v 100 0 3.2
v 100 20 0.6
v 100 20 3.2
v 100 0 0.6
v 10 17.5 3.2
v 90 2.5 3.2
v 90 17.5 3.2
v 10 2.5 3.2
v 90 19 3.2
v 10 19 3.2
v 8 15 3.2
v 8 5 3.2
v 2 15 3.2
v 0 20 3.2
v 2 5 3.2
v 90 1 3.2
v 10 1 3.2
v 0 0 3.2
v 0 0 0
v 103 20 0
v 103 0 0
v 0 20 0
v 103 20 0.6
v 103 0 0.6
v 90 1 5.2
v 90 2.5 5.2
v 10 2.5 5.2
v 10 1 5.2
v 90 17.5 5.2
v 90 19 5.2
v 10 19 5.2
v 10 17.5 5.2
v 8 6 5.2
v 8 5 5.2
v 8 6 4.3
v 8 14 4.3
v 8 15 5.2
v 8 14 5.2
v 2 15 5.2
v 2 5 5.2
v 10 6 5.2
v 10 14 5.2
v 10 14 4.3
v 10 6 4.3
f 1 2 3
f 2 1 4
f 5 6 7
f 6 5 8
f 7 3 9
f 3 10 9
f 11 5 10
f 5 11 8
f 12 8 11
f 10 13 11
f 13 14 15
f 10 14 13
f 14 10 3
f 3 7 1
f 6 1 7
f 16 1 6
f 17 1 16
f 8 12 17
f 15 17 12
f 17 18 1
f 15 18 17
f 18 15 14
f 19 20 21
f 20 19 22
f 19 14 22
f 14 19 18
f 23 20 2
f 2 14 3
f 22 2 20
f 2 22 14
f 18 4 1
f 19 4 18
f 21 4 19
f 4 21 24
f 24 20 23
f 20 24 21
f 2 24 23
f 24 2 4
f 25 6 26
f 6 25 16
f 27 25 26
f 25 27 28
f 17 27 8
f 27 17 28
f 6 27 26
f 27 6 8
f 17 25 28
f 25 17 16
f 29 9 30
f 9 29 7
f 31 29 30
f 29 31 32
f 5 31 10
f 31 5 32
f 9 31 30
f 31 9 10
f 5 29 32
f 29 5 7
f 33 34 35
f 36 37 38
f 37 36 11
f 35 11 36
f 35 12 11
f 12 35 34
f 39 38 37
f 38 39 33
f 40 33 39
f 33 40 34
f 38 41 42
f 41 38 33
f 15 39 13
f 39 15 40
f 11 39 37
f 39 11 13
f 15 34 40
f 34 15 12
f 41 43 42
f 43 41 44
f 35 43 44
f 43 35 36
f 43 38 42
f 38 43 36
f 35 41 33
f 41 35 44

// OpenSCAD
// Bag clip with living hinge - PETG, 0.4mm nozzle, no supports
// Printed open flat (two arms end-to-end), closes by folding 180deg about Y.
// Lower arm at origin, upper arm local origin at its hinge edge.

part = "arm_lower"; // [arm_lower, arm_upper, assembly]
cadverify_only = "";

/* Dimensions (mm) */
Lbody = 100;      // arm body length
Wbody = 20;       // arm width
Tbody = 3.2;      // arm thickness
Hhinge = 6;       // total hinge length (gap between bodies)
Hhalf = 3;        // hinge half length per arm
Thinge = 0.6;     // hinge thickness
Bgap = 2.0;       // bag thickness / closed gap
Ttot = Tbody + Bgap; // 5.2 closed inner top
Zpiv = Tbody + Bgap/2; // 4.2 pivot height
Xpiv = Lbody + Hhalf;  // 103 pivot X in assembly

module instance(name, part, unit = 1) {
    echo(cadverify_instance = [name, part, unit]);
    if (cadverify_only == "" || cadverify_only == name) children();
}

// ---------- lower arm geometry (print orientation, min at 0) ----------
module arm_lower() {
    // body
    cube([Lbody, Wbody, Tbody], false);
    // hinge half (thin, on bed), overlap 0.1 into body
    translate([Lbody-0.1, 0, 0])
        cube([Hhalf+0.1, Wbody, Thinge], false);
    // ribs (2mm tall standoff), overlap 0.1 into body
    translate([10, 1, Tbody-0.1])
        cube([80, 1.5, Bgap+0.1], false);
    translate([10, 17.5, Tbody-0.1])
        cube([80, 1.5, Bgap+0.1], false);
    // latch tower, overlap into body
    translate([2, 5, Tbody-0.1])
        cube([6, 10, Bgap+0.1], false);
    // latch lip (cantilever +X), overlap into tower
    translate([7.9, 6, 4.3])
        cube([2.1, 8, 0.9], false);
}

// ---------- upper arm geometry (print orientation, hinge at x=0) ----------
module arm_upper() {
    // hinge half on bed
    cube([Hhalf+0.1, Wbody, Thinge], false);
    // body, overlap into hinge
    translate([Hhalf-0.1, 0, 0])
        cube([Lbody+0.1, Wbody, Tbody], false);
    // latch tower (maps to closed x=12-18), overlap into body
    translate([85, 5, Tbody-0.1])
        cube([6, 10, Bgap+0.1], false);
    // latch lip (extends +X toward free end), overlap into tower
    translate([91, 6, 4.2])
        cube([2.8, 8, 1.0], false);
    // thumb tab beyond free end, same thickness as body, overlap
    translate([102.9, 6, 0])
        cube([8.1, 8, Tbody], false);
}

// ---------- part / assembly dispatch ----------
if (part == "arm_lower") {
    echo(cadverify_spec = [
        ["bounds", [[0, 0, 0], [103, 20, 5.2]]],
        ["bodies", 1],
        ["through_holes", 0],
        ["support_faces", [["bed", "-z", 1500]]],
        ["overhangs_allowed", [["latch lip", [[7.5, 5.5, 4.0], [10.5, 14.5, 5.5]]]]],
        ["copies", 1],
        ["details", [
            ["arm", "material", [[10, 5, 0.5], [90, 15, 2.7]], 0.95],
            ["arm_wall", "thickness", [50, 10, 10], [0, 0, -1], 3.2],
            ["hinge", "thickness", [101.5, 10, 5], [0, 0, -1], 0.6],
            ["rib", "material", [[20, 1.2, 3.5], [80, 2.3, 5.0]], 1],
            ["latch_tower", "material", [[3, 6, 3.5], [7, 14, 5.0]], 1],
            ["latch_lip", "material", [[8.5, 7, 4.5], [9.5, 13, 5.0]], 0.95],
            ["bag_slot", "void", [[20, 3, 3.5], [80, 17, 5.0]], 0.95]
        ]]
    ]);
    arm_lower();
} else if (part == "arm_upper") {
    echo(cadverify_spec = [
        ["bounds", [[0, 0, 0], [111, 20, 5.2]]],
        ["bodies", 1],
        ["through_holes", 0],
        ["support_faces", [["bed", "-z", 1500]]],
        ["overhangs_allowed", [["latch lip", [[90.5, 5.5, 4.0], [94.5, 14.5, 5.5]]]]],
        ["copies", 1],
        ["details", [
            ["arm", "material", [[10, 5, 0.5], [80, 15, 2.7]], 1],
            ["arm_wall", "thickness", [50, 10, 10], [0, 0, -1], 3.2],
            ["hinge", "thickness", [1.5, 10, 5], [0, 0, -1], 0.6],
            ["latch_tower", "material", [[86, 6, 3.5], [90, 14, 5.0]], 1],
            ["latch_lip", "material", [[91.5, 7, 4.4], [93.5, 13, 5.0]], 1],
            ["thumb_tab", "material", [[104, 7, 0.5], [110, 13, 2.7]], 1],
            ["field", "void", [[10, 3, 3.5], [80, 17, 5.0]], 1]
        ]]
    ]);
    arm_upper();
} else if (part == "assembly") {
    echo(cadverify_spec = [
        ["bounds", [[0, 0, 0], [214, 20, 5.2]]],
        ["support_faces", [["bed", "-z", 3000]]],
        ["motions", [
            ["close", ["upper"], "rotate", [103, 10, 4.2], [0, -1, 0], [0, 180],
                ["flex", [["upper", "lower", 1.0, "latch snap"]]],
                ["stops", [180]]
            ]
        ]],
        ["assembly_order", [
            [["lower"], [0, 0, 0]],
            [["upper"], [0, 0, -1]]
        ]]
    ]);
    instance("lower", "arm_lower") arm_lower();
    instance("upper", "arm_upper") translate([103, 0, 0]) arm_upper();
}
